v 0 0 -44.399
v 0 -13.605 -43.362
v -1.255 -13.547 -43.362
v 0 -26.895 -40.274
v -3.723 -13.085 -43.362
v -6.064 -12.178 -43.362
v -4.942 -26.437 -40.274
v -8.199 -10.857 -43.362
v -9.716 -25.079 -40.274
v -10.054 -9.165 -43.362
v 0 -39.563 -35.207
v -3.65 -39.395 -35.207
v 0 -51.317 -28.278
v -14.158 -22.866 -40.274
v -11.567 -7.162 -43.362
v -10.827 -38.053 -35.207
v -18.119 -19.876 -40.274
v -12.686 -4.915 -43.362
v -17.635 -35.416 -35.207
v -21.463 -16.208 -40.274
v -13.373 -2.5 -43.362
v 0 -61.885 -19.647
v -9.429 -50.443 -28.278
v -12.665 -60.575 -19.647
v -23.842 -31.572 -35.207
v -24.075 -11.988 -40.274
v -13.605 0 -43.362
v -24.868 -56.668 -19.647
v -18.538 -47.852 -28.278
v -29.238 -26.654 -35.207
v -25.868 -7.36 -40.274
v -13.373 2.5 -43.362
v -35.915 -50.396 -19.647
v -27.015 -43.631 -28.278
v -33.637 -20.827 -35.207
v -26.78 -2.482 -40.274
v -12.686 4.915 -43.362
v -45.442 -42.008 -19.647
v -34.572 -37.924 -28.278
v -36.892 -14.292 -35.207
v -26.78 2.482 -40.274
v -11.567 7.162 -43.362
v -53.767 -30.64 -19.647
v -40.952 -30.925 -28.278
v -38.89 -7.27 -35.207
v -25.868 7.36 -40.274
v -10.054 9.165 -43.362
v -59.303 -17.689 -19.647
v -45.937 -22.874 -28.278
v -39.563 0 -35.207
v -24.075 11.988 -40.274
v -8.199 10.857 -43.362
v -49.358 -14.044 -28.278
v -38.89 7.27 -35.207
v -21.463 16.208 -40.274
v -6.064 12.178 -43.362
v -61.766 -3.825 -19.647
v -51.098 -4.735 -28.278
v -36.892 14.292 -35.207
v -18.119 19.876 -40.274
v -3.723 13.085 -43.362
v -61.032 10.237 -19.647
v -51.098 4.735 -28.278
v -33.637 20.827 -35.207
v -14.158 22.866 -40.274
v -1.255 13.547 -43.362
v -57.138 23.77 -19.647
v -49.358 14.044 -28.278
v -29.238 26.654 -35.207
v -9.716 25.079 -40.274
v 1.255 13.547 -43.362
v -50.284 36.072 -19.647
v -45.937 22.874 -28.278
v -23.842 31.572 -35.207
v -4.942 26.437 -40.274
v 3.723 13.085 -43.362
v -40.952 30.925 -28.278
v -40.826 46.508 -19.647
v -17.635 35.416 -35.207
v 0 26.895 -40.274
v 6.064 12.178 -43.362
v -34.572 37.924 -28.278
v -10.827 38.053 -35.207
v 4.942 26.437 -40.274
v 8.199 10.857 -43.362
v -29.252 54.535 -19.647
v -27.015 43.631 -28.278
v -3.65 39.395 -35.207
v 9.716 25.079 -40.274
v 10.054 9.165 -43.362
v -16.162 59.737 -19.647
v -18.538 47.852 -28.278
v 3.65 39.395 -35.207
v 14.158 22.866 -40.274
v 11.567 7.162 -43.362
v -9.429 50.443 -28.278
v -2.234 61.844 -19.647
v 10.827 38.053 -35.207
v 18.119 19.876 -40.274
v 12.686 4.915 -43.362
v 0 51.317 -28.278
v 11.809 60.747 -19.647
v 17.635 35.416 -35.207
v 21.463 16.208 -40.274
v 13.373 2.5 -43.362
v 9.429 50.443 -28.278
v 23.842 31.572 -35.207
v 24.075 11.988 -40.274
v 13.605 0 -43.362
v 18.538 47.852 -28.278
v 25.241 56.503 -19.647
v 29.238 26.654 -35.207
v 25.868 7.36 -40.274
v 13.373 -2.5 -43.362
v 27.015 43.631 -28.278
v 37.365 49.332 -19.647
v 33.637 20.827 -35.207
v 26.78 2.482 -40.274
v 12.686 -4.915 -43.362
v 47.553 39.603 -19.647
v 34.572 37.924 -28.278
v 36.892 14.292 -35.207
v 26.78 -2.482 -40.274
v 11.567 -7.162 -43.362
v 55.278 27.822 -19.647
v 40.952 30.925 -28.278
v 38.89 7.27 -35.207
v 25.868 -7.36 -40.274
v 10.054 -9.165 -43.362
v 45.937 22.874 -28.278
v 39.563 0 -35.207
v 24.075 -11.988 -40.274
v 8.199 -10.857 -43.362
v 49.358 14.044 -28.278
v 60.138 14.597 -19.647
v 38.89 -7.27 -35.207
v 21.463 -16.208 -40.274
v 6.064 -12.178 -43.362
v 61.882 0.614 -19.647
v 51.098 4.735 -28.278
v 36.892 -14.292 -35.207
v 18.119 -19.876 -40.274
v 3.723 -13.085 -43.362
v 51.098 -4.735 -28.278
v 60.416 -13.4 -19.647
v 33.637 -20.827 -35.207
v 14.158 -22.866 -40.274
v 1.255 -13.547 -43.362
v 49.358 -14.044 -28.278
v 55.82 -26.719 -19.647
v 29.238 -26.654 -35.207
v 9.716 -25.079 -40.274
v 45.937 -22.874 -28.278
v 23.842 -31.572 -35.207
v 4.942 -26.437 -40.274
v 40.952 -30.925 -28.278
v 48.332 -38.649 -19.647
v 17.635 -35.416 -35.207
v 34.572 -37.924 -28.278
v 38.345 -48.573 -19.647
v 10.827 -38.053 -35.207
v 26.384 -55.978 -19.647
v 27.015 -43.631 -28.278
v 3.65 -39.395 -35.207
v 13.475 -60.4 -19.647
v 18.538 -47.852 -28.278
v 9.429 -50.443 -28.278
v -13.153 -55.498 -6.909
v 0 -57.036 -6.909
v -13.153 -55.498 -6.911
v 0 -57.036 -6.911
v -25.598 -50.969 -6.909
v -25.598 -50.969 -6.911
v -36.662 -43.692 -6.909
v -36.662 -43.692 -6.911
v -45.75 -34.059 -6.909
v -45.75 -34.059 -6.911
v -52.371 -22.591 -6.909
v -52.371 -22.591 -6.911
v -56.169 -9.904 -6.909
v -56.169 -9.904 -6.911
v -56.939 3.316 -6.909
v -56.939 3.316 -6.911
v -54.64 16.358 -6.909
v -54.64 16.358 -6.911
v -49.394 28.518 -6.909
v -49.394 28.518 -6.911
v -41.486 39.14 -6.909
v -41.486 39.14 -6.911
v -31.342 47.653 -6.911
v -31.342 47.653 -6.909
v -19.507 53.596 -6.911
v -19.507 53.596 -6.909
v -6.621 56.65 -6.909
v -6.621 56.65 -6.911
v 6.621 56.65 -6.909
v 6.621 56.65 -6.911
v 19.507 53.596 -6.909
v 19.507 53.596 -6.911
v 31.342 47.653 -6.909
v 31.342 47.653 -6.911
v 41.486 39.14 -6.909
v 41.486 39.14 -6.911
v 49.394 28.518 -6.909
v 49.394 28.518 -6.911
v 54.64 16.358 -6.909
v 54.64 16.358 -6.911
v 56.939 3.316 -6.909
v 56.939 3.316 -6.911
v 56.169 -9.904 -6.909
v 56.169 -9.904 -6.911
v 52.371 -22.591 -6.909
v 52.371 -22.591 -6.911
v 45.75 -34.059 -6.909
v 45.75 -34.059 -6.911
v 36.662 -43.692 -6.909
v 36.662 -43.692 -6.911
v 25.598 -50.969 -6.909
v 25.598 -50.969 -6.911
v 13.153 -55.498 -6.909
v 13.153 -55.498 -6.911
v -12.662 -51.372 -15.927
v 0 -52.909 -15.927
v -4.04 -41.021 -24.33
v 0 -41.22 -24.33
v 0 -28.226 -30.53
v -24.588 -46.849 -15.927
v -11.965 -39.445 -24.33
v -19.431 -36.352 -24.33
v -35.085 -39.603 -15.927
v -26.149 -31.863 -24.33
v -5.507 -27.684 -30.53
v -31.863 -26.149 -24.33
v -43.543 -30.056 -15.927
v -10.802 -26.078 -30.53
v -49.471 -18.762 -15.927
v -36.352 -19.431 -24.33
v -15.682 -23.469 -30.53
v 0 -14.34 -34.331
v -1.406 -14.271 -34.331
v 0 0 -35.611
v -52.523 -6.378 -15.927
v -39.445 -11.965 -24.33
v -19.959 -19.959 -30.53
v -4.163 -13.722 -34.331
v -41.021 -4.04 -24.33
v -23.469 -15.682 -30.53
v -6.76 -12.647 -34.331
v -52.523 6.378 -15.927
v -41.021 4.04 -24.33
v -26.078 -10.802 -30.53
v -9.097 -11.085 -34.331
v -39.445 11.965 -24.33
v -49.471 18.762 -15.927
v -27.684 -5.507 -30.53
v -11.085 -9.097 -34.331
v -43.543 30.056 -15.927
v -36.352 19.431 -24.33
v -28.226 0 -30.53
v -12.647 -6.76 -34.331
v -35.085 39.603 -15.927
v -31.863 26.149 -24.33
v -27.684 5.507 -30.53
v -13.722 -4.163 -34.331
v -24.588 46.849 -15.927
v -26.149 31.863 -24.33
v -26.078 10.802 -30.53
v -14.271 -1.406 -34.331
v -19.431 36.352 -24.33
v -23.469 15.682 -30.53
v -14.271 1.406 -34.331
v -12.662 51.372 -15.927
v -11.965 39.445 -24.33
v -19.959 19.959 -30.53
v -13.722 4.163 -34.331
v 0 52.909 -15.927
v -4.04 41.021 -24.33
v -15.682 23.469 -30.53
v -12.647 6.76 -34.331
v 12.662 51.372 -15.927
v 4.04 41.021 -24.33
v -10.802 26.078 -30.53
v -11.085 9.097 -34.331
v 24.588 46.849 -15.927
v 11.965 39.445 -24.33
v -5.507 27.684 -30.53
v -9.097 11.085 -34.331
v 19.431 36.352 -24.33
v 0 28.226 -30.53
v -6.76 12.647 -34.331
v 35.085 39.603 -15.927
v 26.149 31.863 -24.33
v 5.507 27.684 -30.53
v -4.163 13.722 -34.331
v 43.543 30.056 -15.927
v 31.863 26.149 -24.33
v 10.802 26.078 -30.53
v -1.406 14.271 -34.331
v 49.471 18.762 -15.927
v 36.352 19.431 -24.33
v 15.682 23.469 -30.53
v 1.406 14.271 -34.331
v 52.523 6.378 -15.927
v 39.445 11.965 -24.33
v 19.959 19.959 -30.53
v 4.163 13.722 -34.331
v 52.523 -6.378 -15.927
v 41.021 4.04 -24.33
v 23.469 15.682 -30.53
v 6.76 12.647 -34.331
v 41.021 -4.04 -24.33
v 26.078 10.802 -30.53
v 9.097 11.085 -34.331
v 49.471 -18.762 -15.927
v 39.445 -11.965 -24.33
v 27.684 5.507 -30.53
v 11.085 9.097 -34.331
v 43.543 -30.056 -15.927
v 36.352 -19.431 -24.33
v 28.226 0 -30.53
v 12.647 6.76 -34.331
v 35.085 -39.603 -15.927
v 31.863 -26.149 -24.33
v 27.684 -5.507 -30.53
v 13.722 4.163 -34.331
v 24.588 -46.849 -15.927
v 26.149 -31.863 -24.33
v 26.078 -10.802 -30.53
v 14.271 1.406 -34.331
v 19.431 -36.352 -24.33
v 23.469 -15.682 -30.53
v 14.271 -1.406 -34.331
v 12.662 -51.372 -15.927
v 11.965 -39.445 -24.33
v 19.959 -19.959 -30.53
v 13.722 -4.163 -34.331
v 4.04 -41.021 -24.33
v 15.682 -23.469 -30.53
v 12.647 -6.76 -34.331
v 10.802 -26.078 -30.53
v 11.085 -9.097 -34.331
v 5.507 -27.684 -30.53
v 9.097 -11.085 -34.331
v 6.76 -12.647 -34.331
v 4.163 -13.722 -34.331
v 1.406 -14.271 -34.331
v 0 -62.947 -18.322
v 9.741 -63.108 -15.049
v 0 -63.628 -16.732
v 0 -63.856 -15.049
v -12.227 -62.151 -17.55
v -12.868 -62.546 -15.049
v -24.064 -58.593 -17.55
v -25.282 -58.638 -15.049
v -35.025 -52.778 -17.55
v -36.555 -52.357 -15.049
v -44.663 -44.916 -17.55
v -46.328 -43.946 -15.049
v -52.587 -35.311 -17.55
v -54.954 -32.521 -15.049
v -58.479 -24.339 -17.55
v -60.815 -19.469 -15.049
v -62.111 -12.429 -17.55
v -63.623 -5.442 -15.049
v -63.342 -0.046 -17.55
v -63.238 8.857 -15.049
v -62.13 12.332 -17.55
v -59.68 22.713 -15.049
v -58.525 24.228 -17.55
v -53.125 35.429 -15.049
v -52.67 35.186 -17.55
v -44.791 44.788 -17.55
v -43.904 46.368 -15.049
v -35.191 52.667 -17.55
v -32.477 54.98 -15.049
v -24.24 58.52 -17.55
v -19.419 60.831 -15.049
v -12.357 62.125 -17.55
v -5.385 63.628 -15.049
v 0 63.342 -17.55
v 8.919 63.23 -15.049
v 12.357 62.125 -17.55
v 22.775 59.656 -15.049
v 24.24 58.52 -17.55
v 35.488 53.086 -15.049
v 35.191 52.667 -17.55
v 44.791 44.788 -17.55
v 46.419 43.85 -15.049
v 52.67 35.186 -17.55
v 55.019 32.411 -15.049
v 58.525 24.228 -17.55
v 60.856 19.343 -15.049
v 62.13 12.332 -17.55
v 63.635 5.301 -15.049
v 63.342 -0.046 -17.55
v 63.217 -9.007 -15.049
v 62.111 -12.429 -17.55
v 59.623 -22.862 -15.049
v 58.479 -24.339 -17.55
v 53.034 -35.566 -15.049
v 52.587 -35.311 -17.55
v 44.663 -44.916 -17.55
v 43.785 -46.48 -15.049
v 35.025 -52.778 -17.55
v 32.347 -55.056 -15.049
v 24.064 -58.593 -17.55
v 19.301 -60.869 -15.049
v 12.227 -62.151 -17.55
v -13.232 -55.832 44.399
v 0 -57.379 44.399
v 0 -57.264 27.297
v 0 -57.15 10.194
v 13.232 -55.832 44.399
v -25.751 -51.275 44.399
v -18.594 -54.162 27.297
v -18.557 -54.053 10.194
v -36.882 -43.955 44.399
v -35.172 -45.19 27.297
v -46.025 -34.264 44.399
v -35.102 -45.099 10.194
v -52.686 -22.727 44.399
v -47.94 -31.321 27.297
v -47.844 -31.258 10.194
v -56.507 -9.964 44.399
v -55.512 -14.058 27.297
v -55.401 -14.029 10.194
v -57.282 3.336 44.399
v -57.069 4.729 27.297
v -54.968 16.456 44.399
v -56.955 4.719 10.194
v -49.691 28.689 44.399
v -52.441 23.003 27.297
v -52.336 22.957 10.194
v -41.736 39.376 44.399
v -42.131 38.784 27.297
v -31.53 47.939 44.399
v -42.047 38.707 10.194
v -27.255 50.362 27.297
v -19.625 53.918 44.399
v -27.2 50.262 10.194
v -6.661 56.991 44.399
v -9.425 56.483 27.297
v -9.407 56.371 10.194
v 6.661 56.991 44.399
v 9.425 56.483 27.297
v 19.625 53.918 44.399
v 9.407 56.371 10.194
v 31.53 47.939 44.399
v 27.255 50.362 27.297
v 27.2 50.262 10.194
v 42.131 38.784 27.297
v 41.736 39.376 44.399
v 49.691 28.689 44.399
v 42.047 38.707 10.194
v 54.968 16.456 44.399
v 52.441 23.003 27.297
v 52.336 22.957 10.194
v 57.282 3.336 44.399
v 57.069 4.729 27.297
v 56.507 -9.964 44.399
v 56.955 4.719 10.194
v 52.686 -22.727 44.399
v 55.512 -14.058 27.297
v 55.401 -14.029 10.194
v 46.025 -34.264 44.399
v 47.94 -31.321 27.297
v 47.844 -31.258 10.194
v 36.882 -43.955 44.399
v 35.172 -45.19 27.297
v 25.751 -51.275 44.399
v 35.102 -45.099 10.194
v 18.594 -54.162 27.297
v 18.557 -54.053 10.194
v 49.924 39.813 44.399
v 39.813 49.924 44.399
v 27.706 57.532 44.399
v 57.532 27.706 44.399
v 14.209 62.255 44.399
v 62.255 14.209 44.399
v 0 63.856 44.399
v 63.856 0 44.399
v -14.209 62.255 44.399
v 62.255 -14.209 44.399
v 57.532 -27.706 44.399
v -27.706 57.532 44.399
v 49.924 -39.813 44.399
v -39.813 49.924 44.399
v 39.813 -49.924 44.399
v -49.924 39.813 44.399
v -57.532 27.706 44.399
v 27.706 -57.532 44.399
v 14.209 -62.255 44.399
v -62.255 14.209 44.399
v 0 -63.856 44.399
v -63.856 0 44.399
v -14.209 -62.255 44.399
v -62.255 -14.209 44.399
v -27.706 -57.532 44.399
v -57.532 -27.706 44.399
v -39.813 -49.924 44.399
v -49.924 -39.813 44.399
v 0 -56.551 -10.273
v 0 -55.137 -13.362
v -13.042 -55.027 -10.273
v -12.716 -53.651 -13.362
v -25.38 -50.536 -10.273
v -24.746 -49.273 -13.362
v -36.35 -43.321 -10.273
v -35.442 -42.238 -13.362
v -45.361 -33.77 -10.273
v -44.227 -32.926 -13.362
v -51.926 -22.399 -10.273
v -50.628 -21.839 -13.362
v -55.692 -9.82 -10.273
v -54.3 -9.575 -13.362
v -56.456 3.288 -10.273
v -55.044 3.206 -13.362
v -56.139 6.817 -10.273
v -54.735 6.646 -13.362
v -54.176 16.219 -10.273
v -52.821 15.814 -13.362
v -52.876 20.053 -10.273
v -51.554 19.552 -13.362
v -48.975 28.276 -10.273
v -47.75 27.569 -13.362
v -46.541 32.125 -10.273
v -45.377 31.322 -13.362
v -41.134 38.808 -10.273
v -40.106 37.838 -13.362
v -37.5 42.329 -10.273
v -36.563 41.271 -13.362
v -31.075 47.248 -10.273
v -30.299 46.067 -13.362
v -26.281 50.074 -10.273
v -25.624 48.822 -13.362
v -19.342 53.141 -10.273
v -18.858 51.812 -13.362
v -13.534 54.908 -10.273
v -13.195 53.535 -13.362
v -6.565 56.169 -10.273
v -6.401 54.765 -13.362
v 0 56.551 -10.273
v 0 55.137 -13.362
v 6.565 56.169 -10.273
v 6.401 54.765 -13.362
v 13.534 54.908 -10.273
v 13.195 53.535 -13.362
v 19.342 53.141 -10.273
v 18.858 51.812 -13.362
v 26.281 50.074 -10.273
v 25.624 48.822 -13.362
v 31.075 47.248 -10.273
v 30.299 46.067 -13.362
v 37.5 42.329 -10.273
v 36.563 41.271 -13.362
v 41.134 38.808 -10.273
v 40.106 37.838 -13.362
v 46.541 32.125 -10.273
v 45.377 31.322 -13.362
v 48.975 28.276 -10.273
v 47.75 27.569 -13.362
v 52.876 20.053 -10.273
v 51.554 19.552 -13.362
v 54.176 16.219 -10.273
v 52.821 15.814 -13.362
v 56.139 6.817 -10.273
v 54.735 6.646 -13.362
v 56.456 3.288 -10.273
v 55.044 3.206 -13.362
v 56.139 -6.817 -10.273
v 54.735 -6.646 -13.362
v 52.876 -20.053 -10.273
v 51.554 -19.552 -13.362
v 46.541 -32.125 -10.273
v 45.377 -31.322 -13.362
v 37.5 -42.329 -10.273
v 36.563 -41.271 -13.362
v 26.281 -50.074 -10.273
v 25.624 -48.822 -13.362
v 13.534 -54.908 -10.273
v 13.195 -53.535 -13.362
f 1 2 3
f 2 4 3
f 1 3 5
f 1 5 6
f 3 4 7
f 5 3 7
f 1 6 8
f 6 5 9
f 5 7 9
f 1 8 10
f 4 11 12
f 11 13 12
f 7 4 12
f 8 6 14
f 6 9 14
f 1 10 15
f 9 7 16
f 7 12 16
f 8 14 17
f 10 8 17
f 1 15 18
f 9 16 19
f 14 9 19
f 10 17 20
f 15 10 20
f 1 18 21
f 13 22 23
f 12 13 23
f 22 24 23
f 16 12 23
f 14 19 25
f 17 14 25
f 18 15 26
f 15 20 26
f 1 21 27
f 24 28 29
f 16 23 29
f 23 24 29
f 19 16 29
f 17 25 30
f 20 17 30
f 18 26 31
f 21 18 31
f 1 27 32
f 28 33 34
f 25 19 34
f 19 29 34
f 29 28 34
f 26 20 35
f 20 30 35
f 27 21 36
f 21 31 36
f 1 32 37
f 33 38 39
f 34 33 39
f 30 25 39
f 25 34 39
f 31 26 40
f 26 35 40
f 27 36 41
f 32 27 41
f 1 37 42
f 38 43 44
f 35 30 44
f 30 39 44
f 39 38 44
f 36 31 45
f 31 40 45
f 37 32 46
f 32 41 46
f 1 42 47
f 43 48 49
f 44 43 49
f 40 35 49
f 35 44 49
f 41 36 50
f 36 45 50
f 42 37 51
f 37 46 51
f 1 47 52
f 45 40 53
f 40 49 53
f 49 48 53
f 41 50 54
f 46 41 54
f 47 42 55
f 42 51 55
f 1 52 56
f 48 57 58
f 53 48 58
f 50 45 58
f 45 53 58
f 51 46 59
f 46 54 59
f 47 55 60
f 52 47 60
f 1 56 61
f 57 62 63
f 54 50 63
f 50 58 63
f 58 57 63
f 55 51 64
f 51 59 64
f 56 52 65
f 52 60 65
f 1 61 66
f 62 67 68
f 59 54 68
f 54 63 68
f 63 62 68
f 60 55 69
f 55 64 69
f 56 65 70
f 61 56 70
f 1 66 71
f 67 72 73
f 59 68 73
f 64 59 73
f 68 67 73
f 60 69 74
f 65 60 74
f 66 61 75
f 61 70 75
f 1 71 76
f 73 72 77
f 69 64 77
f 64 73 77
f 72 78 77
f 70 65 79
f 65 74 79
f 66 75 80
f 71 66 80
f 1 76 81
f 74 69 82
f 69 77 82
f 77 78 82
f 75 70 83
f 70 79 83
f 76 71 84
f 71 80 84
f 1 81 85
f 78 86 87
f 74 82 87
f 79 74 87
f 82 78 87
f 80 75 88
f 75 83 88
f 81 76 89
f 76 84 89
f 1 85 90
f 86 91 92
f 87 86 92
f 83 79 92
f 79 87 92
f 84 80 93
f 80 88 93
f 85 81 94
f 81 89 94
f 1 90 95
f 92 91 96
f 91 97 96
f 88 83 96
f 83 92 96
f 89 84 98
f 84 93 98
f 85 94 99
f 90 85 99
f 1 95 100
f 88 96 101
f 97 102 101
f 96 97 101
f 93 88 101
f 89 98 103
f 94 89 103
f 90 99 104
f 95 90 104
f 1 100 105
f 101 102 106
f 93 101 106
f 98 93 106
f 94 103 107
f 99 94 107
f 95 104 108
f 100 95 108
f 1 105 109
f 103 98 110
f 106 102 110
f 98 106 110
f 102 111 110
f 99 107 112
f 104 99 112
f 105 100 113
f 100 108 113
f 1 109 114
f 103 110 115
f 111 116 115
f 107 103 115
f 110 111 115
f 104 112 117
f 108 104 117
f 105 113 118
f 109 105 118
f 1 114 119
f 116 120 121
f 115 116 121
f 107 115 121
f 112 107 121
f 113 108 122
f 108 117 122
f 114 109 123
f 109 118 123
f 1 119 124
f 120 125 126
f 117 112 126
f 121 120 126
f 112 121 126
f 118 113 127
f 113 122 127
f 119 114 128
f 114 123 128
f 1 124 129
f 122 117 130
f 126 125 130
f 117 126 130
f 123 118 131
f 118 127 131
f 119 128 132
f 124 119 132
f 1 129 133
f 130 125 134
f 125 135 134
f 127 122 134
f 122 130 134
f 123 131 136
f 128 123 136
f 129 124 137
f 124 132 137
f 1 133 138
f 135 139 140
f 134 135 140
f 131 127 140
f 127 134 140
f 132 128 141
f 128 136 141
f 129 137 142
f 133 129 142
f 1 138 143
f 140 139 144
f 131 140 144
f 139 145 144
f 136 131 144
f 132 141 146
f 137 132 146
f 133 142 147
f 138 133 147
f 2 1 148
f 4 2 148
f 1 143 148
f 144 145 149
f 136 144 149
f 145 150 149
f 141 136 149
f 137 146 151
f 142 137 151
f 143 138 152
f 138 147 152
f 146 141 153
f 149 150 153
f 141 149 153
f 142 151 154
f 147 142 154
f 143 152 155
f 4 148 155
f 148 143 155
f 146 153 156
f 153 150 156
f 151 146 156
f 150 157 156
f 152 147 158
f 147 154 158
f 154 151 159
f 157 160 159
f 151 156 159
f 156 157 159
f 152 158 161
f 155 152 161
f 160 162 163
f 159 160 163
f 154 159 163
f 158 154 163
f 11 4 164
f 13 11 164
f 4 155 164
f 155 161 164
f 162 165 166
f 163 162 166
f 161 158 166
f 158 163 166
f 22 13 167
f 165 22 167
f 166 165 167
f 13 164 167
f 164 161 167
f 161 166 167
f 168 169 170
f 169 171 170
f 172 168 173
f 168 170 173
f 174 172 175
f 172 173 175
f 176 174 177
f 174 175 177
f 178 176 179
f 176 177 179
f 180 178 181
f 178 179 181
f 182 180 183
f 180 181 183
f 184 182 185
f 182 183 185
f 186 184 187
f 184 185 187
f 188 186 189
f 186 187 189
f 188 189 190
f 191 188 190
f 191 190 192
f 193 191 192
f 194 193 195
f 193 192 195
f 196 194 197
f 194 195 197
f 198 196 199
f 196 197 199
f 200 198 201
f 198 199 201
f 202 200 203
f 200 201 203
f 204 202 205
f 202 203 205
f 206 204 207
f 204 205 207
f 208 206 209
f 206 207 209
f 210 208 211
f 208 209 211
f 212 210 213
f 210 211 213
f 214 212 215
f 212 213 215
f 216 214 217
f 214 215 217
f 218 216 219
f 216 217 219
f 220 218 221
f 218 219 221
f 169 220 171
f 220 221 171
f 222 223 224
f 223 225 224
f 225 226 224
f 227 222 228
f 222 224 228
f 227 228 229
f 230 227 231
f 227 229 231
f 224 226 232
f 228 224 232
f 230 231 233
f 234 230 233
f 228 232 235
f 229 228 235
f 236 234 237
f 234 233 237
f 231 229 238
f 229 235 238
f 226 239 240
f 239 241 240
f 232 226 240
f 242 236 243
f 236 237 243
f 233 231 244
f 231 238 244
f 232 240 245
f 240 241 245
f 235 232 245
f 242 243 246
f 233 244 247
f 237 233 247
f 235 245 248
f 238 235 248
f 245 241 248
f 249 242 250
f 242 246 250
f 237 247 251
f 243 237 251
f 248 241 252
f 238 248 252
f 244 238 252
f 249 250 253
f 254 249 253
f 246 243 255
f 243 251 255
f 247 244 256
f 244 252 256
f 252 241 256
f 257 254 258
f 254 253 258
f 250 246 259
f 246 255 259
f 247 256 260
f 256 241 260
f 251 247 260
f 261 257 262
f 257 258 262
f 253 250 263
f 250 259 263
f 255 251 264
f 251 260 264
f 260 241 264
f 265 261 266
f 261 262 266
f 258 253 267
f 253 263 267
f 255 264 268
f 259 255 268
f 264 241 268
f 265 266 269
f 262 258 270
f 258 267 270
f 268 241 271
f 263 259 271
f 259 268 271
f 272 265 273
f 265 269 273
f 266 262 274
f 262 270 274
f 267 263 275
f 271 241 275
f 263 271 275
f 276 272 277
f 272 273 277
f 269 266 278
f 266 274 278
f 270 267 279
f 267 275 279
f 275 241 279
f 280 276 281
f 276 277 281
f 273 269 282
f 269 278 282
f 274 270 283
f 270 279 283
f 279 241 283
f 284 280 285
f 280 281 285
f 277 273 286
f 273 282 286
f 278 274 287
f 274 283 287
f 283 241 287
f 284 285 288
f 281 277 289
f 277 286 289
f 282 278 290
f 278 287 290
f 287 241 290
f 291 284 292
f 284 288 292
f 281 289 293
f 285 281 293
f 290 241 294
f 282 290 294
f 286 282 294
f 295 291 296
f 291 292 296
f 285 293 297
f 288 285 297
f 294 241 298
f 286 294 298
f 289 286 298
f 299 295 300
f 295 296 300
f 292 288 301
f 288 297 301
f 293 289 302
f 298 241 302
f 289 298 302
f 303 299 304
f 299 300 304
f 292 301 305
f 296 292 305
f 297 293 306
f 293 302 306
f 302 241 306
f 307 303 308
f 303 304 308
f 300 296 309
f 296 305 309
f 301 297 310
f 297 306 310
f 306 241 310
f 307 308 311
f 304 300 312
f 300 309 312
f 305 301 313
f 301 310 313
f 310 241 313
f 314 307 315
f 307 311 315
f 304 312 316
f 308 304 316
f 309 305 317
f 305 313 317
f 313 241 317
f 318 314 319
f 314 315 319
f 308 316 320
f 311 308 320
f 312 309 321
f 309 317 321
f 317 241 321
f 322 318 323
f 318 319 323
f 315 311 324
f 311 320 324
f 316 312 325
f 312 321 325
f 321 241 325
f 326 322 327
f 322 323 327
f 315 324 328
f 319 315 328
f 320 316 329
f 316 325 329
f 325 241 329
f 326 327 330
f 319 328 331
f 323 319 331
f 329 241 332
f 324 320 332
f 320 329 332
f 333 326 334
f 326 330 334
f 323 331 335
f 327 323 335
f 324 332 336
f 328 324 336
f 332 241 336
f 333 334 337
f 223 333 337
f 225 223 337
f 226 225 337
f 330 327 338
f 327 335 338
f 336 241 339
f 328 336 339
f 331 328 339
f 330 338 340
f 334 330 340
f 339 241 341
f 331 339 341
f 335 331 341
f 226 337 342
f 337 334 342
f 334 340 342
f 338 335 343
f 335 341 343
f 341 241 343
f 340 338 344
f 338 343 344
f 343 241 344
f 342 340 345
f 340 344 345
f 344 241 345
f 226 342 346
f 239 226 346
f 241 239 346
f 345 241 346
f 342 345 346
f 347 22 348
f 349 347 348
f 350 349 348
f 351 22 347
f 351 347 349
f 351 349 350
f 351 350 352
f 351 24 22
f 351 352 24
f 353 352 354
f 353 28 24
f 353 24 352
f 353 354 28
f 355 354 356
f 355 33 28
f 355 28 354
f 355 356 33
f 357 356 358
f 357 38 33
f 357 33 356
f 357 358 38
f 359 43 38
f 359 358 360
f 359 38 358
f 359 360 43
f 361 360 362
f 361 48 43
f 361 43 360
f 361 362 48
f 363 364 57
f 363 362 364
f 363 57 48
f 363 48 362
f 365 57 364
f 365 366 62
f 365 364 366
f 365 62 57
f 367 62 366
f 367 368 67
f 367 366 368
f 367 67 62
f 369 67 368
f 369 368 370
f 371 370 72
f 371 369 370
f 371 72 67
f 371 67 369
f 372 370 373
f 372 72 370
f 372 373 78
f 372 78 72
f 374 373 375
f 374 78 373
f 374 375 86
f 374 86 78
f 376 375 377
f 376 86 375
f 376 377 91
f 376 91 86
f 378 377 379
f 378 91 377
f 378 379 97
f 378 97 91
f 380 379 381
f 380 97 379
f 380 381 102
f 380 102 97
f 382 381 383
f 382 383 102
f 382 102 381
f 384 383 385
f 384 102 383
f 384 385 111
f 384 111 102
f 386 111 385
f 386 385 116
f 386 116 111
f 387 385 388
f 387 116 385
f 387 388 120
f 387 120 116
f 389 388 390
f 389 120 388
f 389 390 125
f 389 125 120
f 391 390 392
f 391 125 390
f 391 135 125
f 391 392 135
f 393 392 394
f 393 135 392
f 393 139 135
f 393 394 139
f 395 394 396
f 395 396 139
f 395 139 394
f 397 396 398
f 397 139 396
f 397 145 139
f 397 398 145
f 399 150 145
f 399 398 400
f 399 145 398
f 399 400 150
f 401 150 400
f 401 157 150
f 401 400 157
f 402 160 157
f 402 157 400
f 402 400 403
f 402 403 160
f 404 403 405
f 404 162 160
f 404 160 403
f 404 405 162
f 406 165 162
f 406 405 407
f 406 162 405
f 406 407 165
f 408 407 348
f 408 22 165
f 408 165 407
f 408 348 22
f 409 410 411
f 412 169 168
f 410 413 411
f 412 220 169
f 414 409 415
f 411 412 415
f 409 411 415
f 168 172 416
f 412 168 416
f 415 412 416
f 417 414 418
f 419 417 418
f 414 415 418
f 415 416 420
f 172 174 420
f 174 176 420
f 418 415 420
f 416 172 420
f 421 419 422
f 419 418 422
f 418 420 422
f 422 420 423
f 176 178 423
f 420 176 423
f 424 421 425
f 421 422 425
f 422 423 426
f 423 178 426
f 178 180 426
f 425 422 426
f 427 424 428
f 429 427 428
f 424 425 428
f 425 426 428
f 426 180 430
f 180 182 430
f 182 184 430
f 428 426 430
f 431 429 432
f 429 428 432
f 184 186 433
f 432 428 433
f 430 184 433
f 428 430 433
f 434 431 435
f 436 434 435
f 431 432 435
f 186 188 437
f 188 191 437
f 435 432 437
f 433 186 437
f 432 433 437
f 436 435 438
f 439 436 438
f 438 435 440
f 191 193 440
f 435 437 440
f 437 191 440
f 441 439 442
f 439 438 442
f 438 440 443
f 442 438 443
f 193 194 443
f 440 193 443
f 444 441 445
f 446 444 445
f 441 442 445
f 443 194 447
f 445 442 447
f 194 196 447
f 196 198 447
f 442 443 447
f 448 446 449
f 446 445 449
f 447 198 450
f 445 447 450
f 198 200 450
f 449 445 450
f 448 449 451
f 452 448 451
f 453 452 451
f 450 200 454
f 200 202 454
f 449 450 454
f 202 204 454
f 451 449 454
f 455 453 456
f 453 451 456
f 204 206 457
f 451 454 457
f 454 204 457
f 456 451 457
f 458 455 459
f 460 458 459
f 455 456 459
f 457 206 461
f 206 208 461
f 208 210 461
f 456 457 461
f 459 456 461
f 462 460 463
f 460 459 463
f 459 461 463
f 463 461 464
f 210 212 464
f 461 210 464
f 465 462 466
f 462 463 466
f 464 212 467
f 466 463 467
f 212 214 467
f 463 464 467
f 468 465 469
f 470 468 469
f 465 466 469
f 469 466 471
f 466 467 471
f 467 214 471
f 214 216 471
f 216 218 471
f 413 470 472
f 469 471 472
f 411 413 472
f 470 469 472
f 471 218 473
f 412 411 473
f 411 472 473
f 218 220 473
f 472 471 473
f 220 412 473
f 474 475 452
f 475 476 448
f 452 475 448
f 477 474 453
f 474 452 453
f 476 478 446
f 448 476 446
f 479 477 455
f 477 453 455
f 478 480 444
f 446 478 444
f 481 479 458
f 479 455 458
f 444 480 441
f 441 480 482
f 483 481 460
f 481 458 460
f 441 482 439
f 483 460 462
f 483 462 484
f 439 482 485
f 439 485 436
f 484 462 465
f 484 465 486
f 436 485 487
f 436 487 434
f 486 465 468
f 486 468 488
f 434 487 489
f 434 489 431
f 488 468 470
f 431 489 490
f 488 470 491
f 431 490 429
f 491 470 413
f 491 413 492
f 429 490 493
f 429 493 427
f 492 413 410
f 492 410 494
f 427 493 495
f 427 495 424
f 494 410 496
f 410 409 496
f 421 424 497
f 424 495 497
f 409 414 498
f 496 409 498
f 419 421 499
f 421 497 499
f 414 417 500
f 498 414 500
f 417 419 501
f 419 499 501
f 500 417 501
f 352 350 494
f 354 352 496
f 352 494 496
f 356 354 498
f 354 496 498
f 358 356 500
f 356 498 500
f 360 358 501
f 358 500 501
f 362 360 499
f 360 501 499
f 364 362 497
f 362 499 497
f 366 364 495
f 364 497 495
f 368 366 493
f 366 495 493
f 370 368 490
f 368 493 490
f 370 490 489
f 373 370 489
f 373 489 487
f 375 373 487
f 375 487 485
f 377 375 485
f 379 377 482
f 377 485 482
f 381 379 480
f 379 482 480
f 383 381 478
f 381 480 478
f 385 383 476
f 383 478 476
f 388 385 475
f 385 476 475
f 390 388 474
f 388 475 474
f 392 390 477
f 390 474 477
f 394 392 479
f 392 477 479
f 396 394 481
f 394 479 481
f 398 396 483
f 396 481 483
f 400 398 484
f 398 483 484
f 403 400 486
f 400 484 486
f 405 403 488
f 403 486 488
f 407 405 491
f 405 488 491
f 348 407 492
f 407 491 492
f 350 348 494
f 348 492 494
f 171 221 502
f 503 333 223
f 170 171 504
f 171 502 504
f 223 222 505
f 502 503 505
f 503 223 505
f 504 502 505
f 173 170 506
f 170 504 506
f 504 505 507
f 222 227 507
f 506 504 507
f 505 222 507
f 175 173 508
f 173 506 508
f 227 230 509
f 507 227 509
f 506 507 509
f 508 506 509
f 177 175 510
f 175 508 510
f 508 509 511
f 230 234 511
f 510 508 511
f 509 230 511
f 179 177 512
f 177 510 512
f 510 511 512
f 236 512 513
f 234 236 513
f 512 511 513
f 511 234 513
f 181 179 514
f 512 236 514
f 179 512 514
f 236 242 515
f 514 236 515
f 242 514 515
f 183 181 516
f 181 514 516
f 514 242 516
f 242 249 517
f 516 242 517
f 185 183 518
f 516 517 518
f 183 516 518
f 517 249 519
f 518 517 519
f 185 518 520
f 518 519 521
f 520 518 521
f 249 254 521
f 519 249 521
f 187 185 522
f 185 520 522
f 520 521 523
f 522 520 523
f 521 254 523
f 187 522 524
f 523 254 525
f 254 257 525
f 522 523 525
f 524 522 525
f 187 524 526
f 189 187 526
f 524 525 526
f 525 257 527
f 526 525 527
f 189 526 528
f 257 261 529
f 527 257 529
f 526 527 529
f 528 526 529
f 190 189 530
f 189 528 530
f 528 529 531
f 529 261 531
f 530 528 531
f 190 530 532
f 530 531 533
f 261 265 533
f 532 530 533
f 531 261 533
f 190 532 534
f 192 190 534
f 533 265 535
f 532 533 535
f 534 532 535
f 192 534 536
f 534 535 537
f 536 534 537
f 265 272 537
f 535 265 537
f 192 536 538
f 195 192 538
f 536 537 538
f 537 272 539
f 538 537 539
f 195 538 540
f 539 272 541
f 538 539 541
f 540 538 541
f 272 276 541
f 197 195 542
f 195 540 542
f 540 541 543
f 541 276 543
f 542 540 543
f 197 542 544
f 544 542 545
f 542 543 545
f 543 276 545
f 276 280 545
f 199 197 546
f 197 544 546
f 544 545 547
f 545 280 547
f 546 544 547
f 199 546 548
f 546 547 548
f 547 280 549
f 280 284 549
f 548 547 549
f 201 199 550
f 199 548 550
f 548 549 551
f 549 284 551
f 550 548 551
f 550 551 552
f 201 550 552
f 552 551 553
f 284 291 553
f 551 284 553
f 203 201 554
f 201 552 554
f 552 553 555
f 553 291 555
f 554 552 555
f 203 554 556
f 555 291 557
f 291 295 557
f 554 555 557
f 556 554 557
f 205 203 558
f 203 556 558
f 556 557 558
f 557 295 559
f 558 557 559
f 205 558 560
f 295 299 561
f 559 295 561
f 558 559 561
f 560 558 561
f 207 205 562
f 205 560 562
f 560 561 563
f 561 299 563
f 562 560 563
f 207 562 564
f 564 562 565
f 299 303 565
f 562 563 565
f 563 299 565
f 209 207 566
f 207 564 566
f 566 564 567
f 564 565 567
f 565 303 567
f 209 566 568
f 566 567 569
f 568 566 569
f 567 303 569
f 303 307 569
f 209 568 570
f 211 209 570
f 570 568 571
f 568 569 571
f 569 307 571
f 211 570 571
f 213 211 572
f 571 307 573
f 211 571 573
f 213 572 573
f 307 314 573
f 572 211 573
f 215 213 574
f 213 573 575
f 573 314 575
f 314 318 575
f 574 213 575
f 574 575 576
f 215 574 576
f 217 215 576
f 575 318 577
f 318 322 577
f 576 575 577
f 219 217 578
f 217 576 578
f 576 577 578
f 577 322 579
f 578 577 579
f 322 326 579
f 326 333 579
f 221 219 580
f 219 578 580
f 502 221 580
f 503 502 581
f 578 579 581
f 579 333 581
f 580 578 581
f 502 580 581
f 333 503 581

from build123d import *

# Parameters (mm, degrees)
FILLET1_R = 6.35


with BuildPart() as part:
    # Sketch2 → Revolve1 (revolve)
    with BuildSketch(Plane(origin=(0, 0, 0), x_dir=(0, 0, -1), z_dir=(1, 0, 0))):
        with BuildLine():
            Line((35.6108, 0), (44.3992, 0))
            ThreePointArc((44.3992, 0), (37.458984081, -34.604022474), (17.711827813, -63.8556))
            Line((17.711827813, -63.8556), (-44.3992, -63.8556))
            Line((-44.3992, -63.8556), (-44.3992, -57.3786))
            Line((-44.3992, -57.3786), (6.9088, -57.0357))
            Line((6.9088, -57.0357), (6.910792633, -57.0357))
            ThreePointArc((6.910792633, -57.0357), (11.868455582, -55.955071974), (15.926669287, -52.909241979))
            ThreePointArc((15.926669287, -52.909241979), (30.530340961, -28.226108874), (35.6108, 0))
        make_face()
    revolve(axis=Axis((0, 0, 44.3992), (0, 0, -1)))

    # Fillet1
    fillet1_edges = [part.edges().sort_by_distance(p)[0] for p in [
        (0, 63.8556, -17.711827813),
    ]]
    fillet(fillet1_edges, radius=FILLET1_R)


solid = part.part
